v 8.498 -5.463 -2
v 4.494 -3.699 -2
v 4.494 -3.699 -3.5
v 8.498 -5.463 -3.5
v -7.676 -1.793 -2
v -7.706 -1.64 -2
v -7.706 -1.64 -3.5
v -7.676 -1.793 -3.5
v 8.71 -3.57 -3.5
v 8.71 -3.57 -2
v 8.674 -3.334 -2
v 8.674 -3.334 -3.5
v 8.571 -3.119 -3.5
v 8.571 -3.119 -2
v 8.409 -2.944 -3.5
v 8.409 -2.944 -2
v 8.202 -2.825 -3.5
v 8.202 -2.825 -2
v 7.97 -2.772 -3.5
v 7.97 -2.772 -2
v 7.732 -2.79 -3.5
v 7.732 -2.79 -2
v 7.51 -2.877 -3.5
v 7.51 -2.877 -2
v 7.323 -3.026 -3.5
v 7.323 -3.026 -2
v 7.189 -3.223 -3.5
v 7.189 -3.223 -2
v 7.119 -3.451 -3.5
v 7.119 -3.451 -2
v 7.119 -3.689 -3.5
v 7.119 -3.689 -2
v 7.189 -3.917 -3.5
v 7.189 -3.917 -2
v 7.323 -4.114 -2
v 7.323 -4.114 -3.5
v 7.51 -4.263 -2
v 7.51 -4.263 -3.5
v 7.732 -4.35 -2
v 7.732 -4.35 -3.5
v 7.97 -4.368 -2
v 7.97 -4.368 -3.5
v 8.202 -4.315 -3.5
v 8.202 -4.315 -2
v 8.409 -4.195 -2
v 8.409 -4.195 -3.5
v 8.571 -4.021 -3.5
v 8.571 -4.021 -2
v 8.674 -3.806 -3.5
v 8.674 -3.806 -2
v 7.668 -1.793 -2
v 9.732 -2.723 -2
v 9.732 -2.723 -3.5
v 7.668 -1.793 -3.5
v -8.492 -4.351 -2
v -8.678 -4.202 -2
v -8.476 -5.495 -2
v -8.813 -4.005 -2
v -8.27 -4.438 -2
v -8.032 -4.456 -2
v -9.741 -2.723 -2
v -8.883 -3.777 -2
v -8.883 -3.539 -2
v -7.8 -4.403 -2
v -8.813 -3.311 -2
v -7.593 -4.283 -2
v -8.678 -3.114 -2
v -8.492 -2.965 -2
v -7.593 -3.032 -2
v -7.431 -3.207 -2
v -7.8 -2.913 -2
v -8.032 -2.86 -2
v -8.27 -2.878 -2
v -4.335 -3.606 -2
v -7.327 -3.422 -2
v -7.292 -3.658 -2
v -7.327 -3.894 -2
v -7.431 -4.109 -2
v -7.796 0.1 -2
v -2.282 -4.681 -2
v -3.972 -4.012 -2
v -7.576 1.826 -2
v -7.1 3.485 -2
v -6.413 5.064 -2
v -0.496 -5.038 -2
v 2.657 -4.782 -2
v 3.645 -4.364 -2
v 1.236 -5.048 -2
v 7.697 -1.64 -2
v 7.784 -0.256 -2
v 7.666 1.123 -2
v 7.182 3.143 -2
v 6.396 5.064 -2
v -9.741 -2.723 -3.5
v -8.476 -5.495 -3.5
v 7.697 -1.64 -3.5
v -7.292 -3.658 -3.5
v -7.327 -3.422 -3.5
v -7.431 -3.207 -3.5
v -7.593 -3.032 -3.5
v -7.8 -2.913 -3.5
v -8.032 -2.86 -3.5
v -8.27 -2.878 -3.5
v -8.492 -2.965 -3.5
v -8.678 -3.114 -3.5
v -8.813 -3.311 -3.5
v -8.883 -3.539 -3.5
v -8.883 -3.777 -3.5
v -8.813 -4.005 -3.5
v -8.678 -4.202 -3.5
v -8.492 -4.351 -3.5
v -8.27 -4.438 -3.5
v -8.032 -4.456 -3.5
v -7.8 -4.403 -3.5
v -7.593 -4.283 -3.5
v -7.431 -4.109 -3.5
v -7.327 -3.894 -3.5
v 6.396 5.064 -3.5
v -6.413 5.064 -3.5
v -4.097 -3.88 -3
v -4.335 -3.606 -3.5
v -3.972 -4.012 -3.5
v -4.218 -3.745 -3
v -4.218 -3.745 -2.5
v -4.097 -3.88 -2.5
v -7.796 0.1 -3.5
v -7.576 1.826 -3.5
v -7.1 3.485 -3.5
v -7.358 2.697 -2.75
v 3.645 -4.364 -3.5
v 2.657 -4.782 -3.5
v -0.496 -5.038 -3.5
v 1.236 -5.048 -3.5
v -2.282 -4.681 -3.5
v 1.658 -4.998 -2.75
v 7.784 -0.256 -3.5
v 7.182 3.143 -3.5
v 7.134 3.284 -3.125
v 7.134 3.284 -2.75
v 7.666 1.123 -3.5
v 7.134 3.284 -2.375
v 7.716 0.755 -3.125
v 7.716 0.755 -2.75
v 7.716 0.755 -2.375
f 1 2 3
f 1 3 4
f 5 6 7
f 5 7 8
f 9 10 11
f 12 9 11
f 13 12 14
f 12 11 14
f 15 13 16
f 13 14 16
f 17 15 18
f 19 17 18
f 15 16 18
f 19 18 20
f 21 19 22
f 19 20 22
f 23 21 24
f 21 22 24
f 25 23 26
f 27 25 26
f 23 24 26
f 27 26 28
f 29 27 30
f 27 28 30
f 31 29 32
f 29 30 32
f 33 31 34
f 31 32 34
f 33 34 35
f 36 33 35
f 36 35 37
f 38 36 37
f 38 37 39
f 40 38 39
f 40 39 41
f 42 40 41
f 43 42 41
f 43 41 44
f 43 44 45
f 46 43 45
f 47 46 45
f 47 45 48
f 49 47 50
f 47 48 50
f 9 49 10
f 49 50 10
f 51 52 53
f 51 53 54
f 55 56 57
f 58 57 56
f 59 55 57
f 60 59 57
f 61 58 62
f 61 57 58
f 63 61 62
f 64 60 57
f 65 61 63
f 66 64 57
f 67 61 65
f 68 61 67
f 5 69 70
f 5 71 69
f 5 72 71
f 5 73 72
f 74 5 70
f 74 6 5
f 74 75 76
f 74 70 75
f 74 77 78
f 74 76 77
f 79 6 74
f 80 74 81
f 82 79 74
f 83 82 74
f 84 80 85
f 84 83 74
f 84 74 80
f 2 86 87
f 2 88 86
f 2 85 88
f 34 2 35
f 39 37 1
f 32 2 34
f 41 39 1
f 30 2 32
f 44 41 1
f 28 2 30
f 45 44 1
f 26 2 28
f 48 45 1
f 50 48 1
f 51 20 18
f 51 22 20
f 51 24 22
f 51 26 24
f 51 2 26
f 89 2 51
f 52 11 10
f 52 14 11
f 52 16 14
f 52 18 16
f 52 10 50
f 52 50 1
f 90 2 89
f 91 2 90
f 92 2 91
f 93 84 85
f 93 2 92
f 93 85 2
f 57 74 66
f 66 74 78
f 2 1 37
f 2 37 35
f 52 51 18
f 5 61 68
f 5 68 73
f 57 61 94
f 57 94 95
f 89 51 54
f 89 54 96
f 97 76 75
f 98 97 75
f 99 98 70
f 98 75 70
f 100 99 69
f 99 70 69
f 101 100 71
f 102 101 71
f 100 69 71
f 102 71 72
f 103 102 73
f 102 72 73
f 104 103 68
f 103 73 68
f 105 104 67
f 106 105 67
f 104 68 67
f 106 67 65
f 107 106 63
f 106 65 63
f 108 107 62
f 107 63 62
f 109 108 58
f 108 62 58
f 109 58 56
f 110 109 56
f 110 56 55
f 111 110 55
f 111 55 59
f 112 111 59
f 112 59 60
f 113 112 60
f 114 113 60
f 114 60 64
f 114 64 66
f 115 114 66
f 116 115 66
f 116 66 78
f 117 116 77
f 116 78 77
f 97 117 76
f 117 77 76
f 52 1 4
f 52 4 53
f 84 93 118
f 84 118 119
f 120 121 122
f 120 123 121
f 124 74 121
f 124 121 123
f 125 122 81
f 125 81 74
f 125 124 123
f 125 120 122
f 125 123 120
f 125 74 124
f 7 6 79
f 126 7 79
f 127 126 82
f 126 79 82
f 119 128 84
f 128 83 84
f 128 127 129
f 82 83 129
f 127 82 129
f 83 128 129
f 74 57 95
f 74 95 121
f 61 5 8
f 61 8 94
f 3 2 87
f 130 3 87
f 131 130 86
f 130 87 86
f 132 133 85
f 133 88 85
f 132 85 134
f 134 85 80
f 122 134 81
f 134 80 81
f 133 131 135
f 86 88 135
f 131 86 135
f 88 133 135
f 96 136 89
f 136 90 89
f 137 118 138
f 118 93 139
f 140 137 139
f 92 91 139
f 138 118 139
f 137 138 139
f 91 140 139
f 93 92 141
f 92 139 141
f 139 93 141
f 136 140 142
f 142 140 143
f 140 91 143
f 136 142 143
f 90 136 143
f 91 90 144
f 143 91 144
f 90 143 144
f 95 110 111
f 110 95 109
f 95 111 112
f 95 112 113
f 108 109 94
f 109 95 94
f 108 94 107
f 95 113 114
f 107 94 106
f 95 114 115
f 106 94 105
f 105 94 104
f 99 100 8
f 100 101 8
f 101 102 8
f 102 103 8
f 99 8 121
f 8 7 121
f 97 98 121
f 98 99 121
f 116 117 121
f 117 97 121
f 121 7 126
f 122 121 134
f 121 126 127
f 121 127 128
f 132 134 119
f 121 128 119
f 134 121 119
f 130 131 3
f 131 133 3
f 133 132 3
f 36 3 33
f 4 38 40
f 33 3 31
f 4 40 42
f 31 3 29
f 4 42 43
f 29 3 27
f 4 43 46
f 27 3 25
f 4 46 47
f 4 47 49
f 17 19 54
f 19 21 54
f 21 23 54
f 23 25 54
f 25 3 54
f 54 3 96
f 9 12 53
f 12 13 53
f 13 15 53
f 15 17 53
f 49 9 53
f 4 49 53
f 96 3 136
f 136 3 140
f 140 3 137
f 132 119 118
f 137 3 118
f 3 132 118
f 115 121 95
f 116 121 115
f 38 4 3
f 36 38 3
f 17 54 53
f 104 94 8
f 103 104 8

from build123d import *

# Parameters (mm, degrees)
BOSS_EXTRUDE1_START = -2
SKETCH1_R           = 0.8
BOSS_EXTRUDE1_DEPTH = 1.5


with BuildPart() as part:
    # Sketch1 → Boss-Extrude1 (new body)
    with BuildSketch(Plane.XY.offset(BOSS_EXTRUDE1_START)):
        with BuildLine():
            Line((-9.740911438, -2.722813484), (-8.476189779, -5.495368755))
            Line((-8.476189779, -5.495368755), (-4.334626233, -3.606163814))
            add(Edge.make_bspline(
                [(-4.334626233, -3.606163814), (-4.220059154, -3.746893984), (-4.098911696, -3.882323382), (-3.971959366, -4.012075441)],
                knots=[0, 0, 0, 0, 0.126750823, 0.126750823, 0.126750823, 0.126750823], degree=3))
            add(Edge.make_bspline(
                [(4.494162658, -3.699077527), (3.751409152, -4.48949841), (0.818181256, -5.496970155), (-2.253055886, -4.873398081), (-3.971959366, -4.012075441)],
                knots=[0, 0, 0, 0, 0.35390124, 1, 1, 1, 1], degree=3))
            Line((4.494162658, -3.699077527), (8.498351825, -5.462813486))
            Line((8.498351825, -5.462813486), (9.73228444, -2.722813484))
            Line((9.73228444, -2.722813484), (7.667616443, -1.793010133))
            Line((7.667616443, -1.793010133), (7.696555299, -1.640039759))
            add(Edge.make_bspline(
                [(6.39631974, 5.064495713), (6.677952564, 4.488955557), (7.263392082, 3.091949217), (7.791107632, 0.878451291), (7.813586585, -0.798840627), (7.703296692, -1.594388982), (7.696555299, -1.640039759)],
                knots=[0.013511716, 0.013511716, 0.013511716, 0.013511716, 0.127684465, 0.281511893, 0.415370359, 0.42352788, 0.42352788, 0.42352788, 0.42352788], degree=3))
            Line((6.39631974, 5.064495713), (-6.412751764, 5.064495713))
            add(Edge.make_bspline(
                [(-7.706044999, -1.640039759), (-7.92409566, -0.185434038), (-7.675413336, 2.149266822), (-6.7968854, 4.310558244), (-6.412751764, 5.064495713)],
                knots=[0, 0, 0, 0, 0.611703094, 0.967799176, 0.967799176, 0.967799176, 0.967799176], degree=3))
            Line((-7.706044999, -1.640039759), (-7.676243441, -1.793010133))
            Line((-7.676243441, -1.793010133), (-9.740911438, -2.722813484))
        make_face()
        with Locations((-8.091798032, -3.657959287)):
            Circle(SKETCH1_R, mode=Mode.SUBTRACT)
        with Locations((7.909888927, -3.569882761)):
            Circle(SKETCH1_R, mode=Mode.SUBTRACT)
    extrude(amount=-BOSS_EXTRUDE1_DEPTH)


solid = part.part
